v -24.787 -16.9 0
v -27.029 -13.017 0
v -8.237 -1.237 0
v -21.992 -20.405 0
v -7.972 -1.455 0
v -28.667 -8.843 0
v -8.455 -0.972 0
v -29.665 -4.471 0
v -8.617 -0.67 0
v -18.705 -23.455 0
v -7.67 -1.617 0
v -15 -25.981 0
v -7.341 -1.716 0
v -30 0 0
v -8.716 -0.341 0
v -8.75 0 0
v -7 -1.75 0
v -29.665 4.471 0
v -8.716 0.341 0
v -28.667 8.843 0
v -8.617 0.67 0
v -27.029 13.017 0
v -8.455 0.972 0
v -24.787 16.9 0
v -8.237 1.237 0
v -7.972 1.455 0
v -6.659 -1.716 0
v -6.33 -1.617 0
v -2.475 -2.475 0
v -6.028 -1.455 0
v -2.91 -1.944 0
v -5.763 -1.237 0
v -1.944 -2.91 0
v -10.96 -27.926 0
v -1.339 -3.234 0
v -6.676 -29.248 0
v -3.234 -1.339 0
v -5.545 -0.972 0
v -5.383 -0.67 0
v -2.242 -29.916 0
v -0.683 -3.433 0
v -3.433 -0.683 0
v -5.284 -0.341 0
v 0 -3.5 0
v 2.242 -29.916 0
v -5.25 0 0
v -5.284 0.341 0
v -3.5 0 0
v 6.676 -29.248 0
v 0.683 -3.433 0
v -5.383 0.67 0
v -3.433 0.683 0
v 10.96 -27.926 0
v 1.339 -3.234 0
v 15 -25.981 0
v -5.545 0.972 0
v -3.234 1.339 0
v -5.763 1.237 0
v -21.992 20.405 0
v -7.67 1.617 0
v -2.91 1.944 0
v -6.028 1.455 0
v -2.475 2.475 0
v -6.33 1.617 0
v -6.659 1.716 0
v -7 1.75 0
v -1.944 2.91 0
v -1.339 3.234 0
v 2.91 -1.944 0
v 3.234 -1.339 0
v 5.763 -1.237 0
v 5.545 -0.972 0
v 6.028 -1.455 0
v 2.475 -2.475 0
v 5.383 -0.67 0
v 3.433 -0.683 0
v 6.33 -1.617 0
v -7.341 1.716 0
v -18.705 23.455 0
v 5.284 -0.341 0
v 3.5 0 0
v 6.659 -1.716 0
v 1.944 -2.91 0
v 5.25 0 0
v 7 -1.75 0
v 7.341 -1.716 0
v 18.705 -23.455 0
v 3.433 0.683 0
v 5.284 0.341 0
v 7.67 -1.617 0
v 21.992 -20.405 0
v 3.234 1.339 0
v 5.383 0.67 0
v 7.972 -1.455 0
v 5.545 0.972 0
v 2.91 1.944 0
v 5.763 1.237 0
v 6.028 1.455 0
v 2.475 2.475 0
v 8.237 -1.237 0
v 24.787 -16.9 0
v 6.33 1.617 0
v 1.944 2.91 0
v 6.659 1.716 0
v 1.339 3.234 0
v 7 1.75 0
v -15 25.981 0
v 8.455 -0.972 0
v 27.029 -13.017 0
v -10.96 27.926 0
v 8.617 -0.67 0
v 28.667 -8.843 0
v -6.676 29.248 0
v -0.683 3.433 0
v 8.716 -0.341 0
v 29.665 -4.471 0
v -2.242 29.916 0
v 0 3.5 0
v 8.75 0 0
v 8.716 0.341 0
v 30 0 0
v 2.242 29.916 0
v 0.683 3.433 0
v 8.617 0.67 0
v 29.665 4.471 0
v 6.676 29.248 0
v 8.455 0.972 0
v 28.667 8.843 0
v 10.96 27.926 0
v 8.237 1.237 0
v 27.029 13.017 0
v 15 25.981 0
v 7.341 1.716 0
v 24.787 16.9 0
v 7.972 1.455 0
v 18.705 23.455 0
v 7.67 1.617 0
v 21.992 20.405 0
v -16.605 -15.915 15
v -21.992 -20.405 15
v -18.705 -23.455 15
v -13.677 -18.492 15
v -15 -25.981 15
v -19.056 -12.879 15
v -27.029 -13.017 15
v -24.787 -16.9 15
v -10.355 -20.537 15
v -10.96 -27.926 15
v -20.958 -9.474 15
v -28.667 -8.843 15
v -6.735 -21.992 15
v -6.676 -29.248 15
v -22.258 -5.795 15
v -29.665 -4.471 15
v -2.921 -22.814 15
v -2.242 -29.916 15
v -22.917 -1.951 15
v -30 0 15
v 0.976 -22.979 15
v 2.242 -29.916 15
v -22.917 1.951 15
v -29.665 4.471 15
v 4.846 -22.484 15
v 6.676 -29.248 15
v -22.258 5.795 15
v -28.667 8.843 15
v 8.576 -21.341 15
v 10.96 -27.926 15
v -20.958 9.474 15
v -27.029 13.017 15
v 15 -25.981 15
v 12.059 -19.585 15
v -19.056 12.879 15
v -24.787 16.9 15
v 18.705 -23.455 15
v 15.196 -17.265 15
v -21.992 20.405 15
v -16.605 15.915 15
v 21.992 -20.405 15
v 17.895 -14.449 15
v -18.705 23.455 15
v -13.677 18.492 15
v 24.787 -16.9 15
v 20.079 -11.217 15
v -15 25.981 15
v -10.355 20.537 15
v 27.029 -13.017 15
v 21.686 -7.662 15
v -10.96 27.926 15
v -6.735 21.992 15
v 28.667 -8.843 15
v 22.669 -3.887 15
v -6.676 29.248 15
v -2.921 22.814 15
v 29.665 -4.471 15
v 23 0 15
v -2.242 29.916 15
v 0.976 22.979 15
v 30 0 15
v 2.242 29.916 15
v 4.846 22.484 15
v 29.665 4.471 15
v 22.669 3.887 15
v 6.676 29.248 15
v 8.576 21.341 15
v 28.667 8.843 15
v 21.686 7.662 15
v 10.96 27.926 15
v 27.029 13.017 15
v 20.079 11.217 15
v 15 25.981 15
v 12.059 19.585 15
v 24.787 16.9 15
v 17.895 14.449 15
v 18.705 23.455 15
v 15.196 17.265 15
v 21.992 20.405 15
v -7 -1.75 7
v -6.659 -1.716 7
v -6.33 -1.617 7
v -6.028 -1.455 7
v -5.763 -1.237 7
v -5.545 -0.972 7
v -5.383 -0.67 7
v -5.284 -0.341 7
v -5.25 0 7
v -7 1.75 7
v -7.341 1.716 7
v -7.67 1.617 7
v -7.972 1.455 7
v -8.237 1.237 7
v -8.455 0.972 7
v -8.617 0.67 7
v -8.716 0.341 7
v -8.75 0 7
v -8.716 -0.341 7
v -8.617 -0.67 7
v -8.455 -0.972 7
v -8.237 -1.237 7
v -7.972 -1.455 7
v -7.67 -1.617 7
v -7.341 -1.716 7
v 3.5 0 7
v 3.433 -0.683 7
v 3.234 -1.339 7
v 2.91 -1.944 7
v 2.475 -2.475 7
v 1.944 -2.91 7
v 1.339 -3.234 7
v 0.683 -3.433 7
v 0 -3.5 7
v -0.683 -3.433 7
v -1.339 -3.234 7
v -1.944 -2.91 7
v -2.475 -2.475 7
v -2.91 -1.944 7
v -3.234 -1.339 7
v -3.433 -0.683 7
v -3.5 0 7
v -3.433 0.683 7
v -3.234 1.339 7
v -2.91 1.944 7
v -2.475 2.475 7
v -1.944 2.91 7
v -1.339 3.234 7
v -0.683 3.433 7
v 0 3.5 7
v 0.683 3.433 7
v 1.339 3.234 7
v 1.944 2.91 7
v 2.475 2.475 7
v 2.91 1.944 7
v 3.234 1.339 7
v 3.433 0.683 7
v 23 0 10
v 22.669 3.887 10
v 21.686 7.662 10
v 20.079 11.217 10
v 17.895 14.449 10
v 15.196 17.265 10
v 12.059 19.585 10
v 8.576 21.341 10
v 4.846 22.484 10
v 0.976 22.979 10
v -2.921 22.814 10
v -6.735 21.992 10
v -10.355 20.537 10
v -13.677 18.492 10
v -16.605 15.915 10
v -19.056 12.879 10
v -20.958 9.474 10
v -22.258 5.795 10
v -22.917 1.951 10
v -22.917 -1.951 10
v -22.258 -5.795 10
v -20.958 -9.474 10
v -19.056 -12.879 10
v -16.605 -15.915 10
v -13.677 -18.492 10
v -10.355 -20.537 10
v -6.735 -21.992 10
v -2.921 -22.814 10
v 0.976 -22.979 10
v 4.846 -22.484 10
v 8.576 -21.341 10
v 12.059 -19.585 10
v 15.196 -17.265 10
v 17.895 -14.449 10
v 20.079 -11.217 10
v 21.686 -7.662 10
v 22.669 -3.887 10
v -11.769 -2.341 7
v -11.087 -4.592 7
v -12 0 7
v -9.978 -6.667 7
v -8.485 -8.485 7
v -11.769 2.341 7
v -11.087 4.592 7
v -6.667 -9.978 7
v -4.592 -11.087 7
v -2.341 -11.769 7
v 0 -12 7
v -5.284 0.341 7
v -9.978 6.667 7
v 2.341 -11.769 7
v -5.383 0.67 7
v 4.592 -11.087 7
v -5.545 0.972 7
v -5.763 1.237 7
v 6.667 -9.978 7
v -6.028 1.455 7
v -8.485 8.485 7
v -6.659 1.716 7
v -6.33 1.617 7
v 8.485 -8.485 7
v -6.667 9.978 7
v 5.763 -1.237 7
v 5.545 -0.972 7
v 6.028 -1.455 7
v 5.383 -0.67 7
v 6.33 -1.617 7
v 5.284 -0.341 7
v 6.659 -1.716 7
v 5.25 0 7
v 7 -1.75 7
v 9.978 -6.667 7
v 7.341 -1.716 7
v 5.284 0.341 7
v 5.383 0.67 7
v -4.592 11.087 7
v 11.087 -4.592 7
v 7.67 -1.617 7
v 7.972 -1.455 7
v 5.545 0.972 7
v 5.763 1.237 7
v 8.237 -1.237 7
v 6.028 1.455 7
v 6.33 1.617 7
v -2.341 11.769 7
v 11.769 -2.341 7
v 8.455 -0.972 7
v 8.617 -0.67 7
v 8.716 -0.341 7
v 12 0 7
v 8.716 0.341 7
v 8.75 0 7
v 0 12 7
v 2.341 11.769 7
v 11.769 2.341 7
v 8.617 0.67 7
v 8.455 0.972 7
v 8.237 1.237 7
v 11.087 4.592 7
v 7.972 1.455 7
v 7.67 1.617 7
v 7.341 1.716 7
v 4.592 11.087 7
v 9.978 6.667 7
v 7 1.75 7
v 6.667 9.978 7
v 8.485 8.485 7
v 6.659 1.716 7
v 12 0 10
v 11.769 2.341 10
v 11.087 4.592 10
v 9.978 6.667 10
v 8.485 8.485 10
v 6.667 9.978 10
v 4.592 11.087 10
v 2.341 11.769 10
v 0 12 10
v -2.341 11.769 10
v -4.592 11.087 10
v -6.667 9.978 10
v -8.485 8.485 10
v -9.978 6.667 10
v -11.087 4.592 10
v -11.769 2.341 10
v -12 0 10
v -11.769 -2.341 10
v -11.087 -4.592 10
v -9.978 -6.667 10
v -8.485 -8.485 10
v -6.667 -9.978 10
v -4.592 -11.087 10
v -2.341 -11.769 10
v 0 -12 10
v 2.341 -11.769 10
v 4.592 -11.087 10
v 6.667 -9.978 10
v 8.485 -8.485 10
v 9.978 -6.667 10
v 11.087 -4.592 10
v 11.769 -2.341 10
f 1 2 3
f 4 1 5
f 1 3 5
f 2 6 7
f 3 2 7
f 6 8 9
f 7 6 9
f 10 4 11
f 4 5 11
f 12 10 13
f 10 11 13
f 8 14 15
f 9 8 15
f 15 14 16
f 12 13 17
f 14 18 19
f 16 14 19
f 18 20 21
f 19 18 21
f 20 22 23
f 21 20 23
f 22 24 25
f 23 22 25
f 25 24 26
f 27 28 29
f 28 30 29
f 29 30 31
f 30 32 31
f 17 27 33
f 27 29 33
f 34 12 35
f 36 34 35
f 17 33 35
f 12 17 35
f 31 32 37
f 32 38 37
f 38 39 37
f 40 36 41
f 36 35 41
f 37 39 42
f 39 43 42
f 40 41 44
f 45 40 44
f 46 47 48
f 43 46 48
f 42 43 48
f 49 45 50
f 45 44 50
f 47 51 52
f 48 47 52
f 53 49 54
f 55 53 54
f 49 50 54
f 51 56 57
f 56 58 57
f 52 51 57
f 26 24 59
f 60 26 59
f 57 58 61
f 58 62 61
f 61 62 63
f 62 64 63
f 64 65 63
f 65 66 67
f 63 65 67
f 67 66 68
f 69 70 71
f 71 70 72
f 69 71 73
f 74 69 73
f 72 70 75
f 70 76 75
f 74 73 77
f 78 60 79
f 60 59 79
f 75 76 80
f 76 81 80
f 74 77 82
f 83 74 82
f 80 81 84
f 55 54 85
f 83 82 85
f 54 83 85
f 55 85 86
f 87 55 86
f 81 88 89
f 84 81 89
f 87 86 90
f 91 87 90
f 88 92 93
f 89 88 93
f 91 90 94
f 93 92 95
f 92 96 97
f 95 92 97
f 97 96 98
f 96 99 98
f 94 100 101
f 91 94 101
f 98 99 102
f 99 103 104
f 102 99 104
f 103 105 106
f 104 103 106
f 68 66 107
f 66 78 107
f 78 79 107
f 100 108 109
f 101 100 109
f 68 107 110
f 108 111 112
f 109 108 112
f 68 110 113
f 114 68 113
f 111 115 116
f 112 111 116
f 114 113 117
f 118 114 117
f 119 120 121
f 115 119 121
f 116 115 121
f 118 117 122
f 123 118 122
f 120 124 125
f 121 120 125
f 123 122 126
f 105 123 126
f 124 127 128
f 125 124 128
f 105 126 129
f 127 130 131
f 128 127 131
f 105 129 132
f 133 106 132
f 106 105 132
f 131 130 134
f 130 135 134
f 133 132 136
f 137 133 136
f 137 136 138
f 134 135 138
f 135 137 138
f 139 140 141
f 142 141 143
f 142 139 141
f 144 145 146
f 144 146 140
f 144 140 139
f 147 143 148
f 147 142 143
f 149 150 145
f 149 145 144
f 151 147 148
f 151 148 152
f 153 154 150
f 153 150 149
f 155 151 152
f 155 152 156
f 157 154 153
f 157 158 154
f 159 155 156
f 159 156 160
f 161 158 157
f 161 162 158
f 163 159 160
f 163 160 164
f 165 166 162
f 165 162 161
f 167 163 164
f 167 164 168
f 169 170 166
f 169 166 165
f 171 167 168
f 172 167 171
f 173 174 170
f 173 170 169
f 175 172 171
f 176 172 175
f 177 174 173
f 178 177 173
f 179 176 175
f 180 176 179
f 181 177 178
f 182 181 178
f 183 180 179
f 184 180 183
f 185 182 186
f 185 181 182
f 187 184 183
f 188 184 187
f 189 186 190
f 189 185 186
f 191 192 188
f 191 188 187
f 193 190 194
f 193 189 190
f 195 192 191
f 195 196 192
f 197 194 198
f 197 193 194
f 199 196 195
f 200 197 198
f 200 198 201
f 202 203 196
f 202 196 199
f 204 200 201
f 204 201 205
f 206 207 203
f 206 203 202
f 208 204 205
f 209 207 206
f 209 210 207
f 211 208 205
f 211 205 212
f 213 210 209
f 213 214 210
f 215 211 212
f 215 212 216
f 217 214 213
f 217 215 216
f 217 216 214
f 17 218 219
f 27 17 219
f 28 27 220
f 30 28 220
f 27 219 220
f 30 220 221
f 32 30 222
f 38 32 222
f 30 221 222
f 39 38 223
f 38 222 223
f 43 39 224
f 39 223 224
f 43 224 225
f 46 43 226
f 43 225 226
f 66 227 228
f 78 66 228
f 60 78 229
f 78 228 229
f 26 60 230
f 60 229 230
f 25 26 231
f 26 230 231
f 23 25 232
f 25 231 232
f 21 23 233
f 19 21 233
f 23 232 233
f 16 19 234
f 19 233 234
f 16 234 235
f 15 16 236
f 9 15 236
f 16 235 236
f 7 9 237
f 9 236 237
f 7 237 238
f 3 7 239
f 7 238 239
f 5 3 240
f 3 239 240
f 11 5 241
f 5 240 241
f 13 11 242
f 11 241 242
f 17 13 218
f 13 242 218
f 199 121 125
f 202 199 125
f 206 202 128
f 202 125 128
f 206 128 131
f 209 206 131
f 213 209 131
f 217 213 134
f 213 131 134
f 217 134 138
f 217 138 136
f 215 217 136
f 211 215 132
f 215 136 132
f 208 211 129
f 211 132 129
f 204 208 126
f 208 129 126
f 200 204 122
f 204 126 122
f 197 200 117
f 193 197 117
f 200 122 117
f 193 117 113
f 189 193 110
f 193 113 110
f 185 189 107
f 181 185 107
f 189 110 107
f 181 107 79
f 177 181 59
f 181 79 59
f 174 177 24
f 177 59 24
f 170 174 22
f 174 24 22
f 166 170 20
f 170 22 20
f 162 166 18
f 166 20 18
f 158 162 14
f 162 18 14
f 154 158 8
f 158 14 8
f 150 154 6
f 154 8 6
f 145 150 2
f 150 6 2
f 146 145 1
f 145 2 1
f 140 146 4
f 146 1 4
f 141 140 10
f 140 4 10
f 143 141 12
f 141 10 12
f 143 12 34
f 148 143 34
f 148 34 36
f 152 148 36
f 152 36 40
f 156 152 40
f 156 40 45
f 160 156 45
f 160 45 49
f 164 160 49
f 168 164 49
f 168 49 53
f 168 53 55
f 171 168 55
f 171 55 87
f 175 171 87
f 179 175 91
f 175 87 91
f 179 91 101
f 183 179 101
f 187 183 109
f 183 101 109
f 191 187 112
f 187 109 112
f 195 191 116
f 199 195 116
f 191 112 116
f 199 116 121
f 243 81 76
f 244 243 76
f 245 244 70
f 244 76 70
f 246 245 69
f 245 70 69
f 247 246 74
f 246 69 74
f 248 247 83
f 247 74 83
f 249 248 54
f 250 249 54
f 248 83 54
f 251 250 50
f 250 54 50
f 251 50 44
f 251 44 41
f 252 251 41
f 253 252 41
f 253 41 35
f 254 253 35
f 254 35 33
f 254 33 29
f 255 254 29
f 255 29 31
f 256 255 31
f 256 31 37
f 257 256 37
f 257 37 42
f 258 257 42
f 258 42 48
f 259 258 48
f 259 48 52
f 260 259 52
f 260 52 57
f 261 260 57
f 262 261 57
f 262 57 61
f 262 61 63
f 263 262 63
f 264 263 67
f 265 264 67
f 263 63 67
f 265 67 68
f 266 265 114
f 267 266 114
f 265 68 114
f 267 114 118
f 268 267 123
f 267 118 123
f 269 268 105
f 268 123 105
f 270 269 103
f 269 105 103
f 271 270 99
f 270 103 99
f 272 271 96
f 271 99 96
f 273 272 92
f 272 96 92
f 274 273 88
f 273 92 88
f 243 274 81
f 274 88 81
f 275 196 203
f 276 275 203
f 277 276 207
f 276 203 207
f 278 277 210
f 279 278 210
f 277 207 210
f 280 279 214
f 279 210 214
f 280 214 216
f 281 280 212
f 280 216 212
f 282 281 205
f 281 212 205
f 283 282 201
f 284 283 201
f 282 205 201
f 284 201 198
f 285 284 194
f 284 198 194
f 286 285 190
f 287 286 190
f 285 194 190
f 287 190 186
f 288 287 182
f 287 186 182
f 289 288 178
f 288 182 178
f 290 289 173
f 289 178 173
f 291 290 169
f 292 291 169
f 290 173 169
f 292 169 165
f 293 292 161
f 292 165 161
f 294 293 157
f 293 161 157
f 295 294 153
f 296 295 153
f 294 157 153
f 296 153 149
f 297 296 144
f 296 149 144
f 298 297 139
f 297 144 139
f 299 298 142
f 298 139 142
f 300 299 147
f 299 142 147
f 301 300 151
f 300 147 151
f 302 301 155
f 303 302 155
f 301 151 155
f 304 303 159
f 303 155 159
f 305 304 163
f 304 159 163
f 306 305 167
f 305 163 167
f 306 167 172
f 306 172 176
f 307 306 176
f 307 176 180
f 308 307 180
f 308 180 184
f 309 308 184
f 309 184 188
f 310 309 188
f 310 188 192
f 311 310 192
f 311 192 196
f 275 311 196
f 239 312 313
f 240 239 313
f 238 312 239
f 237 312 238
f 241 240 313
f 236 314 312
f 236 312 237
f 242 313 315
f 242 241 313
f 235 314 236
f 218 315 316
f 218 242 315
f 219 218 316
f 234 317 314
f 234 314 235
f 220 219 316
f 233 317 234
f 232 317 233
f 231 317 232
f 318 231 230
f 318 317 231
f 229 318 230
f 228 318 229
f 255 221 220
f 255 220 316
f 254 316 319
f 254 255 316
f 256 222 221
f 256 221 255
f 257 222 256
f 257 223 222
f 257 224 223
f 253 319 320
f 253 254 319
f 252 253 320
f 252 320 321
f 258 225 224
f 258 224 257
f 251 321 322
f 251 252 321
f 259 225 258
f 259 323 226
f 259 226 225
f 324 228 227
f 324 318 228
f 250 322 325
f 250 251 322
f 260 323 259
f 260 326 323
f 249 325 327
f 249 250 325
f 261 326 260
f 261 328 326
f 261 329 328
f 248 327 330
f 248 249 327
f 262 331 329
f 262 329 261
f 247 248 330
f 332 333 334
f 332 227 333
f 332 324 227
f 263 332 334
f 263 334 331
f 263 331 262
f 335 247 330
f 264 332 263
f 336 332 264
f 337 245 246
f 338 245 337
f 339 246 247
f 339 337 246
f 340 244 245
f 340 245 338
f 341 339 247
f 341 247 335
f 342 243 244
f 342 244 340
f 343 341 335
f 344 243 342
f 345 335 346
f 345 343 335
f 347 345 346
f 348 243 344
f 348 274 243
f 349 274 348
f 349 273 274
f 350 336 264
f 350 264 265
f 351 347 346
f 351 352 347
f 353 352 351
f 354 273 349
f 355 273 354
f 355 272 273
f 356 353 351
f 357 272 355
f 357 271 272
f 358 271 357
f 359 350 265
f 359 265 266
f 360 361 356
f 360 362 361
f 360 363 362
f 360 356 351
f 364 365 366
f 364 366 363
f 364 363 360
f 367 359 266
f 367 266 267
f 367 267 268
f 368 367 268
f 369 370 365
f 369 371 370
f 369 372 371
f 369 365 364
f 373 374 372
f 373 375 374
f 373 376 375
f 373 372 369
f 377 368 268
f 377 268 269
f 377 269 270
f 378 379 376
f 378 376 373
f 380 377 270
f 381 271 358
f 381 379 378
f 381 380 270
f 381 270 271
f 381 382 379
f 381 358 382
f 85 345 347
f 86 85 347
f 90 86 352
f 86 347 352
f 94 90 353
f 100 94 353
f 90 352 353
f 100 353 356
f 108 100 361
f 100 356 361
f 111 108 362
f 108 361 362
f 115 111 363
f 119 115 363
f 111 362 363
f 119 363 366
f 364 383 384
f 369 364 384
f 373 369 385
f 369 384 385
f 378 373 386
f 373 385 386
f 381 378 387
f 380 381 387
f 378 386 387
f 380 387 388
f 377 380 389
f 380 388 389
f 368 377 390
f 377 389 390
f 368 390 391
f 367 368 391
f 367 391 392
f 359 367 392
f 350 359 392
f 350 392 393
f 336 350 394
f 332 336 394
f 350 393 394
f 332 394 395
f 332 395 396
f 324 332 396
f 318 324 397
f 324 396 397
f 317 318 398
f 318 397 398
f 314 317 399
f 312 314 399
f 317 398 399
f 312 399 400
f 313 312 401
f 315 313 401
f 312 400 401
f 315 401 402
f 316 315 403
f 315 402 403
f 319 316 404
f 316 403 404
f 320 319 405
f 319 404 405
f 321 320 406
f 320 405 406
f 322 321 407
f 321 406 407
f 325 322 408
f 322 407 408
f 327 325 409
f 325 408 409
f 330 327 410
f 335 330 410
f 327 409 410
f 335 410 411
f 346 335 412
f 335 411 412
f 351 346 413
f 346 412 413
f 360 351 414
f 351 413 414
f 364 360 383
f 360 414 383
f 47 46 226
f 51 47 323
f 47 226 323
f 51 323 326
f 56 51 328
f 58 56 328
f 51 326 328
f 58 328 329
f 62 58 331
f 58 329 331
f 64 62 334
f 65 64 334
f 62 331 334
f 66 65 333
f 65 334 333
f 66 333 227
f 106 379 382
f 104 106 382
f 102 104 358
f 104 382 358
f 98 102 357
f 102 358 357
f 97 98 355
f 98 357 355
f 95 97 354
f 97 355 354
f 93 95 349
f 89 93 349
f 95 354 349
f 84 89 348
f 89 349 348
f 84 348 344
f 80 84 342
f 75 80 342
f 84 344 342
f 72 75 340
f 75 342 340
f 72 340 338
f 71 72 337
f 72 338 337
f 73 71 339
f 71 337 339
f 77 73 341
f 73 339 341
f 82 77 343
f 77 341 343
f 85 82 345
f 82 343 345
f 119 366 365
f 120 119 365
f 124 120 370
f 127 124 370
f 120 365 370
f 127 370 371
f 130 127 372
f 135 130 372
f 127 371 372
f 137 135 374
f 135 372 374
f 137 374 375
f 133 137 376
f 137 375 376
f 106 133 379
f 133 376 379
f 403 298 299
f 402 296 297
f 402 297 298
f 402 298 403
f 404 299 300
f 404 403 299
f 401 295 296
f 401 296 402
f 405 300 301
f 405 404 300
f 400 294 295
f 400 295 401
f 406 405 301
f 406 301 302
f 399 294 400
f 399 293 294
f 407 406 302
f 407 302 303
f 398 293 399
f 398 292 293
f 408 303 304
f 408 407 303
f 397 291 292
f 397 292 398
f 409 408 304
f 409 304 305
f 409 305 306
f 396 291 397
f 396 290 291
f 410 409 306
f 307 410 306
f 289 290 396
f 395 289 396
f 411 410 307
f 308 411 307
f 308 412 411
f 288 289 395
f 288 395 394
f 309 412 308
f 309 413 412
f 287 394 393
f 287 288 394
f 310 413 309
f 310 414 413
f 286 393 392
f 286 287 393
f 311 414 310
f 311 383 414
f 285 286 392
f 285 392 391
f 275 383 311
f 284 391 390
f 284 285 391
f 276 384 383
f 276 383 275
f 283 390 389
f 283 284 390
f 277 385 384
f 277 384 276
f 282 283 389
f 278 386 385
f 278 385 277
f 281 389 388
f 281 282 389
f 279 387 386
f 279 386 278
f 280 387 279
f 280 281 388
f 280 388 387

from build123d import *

# Parameters (mm, degrees)
F0_R     = 30
F1_DEPTH = 15
F3_DEPTH = 25
F4_R     = 23
F5_DEPTH = 5
F6_R     = 12
F7_DEPTH = 3
F8_R     = 3.5
F9_DEPTH = 25


with BuildPart() as f1:
    # F0 (on Top) → F1 (new body)
    with BuildSketch(Plane.XY):
        Circle(F0_R)
    extrude(amount=F1_DEPTH)

    # F2 (on face) → F3 (cut)
    with BuildSketch(Plane.XY.offset(15)):
        with BuildLine():
            ThreePointArc((-5.25, 0), (-5.7625631329, 1.2374368671), (-7, 1.75))
            Line((-7, 1.75), (-7, -1.75))
            ThreePointArc((-7, -1.75), (-5.7625631329, -1.2374368671), (-5.25, 0))
        make_face()
        with BuildLine():
            Line((-7, -1.75), (-7, 1.75))
            ThreePointArc((-7, 1.75), (-8.75, 0), (-7, -1.75))
        make_face()
        with BuildLine():
            Line((7, -1.75), (7, 1.75))
            ThreePointArc((7, 1.75), (5.25, 0), (7, -1.75))
        make_face()
        with BuildLine():
            ThreePointArc((8.75, 0), (8.2374368671, 1.2374368671), (7, 1.75))
            Line((7, 1.75), (7, -1.75))
            ThreePointArc((7, -1.75), (8.2374368671, -1.2374368671), (8.75, 0))
        make_face()
    extrude(amount=-F3_DEPTH, mode=Mode.SUBTRACT)

    # F4 (on face) → F5 (cut)
    with BuildSketch(Plane.XY.offset(15)):
        Circle(F4_R)
    extrude(amount=-F5_DEPTH, mode=Mode.SUBTRACT)

    # F6 (on face) → F7 (cut)
    with BuildSketch(Plane.XY.offset(10)):
        Circle(F6_R)
    extrude(amount=-F7_DEPTH, mode=Mode.SUBTRACT)

    # F8 (on face) → F9 (cut)
    with BuildSketch(Plane(origin=(0, 0, 0), x_dir=(1, 0, 0), z_dir=(0, 0, -1))):
        Circle(F8_R)
    extrude(amount=-F9_DEPTH, mode=Mode.SUBTRACT)


solid = f1.part
